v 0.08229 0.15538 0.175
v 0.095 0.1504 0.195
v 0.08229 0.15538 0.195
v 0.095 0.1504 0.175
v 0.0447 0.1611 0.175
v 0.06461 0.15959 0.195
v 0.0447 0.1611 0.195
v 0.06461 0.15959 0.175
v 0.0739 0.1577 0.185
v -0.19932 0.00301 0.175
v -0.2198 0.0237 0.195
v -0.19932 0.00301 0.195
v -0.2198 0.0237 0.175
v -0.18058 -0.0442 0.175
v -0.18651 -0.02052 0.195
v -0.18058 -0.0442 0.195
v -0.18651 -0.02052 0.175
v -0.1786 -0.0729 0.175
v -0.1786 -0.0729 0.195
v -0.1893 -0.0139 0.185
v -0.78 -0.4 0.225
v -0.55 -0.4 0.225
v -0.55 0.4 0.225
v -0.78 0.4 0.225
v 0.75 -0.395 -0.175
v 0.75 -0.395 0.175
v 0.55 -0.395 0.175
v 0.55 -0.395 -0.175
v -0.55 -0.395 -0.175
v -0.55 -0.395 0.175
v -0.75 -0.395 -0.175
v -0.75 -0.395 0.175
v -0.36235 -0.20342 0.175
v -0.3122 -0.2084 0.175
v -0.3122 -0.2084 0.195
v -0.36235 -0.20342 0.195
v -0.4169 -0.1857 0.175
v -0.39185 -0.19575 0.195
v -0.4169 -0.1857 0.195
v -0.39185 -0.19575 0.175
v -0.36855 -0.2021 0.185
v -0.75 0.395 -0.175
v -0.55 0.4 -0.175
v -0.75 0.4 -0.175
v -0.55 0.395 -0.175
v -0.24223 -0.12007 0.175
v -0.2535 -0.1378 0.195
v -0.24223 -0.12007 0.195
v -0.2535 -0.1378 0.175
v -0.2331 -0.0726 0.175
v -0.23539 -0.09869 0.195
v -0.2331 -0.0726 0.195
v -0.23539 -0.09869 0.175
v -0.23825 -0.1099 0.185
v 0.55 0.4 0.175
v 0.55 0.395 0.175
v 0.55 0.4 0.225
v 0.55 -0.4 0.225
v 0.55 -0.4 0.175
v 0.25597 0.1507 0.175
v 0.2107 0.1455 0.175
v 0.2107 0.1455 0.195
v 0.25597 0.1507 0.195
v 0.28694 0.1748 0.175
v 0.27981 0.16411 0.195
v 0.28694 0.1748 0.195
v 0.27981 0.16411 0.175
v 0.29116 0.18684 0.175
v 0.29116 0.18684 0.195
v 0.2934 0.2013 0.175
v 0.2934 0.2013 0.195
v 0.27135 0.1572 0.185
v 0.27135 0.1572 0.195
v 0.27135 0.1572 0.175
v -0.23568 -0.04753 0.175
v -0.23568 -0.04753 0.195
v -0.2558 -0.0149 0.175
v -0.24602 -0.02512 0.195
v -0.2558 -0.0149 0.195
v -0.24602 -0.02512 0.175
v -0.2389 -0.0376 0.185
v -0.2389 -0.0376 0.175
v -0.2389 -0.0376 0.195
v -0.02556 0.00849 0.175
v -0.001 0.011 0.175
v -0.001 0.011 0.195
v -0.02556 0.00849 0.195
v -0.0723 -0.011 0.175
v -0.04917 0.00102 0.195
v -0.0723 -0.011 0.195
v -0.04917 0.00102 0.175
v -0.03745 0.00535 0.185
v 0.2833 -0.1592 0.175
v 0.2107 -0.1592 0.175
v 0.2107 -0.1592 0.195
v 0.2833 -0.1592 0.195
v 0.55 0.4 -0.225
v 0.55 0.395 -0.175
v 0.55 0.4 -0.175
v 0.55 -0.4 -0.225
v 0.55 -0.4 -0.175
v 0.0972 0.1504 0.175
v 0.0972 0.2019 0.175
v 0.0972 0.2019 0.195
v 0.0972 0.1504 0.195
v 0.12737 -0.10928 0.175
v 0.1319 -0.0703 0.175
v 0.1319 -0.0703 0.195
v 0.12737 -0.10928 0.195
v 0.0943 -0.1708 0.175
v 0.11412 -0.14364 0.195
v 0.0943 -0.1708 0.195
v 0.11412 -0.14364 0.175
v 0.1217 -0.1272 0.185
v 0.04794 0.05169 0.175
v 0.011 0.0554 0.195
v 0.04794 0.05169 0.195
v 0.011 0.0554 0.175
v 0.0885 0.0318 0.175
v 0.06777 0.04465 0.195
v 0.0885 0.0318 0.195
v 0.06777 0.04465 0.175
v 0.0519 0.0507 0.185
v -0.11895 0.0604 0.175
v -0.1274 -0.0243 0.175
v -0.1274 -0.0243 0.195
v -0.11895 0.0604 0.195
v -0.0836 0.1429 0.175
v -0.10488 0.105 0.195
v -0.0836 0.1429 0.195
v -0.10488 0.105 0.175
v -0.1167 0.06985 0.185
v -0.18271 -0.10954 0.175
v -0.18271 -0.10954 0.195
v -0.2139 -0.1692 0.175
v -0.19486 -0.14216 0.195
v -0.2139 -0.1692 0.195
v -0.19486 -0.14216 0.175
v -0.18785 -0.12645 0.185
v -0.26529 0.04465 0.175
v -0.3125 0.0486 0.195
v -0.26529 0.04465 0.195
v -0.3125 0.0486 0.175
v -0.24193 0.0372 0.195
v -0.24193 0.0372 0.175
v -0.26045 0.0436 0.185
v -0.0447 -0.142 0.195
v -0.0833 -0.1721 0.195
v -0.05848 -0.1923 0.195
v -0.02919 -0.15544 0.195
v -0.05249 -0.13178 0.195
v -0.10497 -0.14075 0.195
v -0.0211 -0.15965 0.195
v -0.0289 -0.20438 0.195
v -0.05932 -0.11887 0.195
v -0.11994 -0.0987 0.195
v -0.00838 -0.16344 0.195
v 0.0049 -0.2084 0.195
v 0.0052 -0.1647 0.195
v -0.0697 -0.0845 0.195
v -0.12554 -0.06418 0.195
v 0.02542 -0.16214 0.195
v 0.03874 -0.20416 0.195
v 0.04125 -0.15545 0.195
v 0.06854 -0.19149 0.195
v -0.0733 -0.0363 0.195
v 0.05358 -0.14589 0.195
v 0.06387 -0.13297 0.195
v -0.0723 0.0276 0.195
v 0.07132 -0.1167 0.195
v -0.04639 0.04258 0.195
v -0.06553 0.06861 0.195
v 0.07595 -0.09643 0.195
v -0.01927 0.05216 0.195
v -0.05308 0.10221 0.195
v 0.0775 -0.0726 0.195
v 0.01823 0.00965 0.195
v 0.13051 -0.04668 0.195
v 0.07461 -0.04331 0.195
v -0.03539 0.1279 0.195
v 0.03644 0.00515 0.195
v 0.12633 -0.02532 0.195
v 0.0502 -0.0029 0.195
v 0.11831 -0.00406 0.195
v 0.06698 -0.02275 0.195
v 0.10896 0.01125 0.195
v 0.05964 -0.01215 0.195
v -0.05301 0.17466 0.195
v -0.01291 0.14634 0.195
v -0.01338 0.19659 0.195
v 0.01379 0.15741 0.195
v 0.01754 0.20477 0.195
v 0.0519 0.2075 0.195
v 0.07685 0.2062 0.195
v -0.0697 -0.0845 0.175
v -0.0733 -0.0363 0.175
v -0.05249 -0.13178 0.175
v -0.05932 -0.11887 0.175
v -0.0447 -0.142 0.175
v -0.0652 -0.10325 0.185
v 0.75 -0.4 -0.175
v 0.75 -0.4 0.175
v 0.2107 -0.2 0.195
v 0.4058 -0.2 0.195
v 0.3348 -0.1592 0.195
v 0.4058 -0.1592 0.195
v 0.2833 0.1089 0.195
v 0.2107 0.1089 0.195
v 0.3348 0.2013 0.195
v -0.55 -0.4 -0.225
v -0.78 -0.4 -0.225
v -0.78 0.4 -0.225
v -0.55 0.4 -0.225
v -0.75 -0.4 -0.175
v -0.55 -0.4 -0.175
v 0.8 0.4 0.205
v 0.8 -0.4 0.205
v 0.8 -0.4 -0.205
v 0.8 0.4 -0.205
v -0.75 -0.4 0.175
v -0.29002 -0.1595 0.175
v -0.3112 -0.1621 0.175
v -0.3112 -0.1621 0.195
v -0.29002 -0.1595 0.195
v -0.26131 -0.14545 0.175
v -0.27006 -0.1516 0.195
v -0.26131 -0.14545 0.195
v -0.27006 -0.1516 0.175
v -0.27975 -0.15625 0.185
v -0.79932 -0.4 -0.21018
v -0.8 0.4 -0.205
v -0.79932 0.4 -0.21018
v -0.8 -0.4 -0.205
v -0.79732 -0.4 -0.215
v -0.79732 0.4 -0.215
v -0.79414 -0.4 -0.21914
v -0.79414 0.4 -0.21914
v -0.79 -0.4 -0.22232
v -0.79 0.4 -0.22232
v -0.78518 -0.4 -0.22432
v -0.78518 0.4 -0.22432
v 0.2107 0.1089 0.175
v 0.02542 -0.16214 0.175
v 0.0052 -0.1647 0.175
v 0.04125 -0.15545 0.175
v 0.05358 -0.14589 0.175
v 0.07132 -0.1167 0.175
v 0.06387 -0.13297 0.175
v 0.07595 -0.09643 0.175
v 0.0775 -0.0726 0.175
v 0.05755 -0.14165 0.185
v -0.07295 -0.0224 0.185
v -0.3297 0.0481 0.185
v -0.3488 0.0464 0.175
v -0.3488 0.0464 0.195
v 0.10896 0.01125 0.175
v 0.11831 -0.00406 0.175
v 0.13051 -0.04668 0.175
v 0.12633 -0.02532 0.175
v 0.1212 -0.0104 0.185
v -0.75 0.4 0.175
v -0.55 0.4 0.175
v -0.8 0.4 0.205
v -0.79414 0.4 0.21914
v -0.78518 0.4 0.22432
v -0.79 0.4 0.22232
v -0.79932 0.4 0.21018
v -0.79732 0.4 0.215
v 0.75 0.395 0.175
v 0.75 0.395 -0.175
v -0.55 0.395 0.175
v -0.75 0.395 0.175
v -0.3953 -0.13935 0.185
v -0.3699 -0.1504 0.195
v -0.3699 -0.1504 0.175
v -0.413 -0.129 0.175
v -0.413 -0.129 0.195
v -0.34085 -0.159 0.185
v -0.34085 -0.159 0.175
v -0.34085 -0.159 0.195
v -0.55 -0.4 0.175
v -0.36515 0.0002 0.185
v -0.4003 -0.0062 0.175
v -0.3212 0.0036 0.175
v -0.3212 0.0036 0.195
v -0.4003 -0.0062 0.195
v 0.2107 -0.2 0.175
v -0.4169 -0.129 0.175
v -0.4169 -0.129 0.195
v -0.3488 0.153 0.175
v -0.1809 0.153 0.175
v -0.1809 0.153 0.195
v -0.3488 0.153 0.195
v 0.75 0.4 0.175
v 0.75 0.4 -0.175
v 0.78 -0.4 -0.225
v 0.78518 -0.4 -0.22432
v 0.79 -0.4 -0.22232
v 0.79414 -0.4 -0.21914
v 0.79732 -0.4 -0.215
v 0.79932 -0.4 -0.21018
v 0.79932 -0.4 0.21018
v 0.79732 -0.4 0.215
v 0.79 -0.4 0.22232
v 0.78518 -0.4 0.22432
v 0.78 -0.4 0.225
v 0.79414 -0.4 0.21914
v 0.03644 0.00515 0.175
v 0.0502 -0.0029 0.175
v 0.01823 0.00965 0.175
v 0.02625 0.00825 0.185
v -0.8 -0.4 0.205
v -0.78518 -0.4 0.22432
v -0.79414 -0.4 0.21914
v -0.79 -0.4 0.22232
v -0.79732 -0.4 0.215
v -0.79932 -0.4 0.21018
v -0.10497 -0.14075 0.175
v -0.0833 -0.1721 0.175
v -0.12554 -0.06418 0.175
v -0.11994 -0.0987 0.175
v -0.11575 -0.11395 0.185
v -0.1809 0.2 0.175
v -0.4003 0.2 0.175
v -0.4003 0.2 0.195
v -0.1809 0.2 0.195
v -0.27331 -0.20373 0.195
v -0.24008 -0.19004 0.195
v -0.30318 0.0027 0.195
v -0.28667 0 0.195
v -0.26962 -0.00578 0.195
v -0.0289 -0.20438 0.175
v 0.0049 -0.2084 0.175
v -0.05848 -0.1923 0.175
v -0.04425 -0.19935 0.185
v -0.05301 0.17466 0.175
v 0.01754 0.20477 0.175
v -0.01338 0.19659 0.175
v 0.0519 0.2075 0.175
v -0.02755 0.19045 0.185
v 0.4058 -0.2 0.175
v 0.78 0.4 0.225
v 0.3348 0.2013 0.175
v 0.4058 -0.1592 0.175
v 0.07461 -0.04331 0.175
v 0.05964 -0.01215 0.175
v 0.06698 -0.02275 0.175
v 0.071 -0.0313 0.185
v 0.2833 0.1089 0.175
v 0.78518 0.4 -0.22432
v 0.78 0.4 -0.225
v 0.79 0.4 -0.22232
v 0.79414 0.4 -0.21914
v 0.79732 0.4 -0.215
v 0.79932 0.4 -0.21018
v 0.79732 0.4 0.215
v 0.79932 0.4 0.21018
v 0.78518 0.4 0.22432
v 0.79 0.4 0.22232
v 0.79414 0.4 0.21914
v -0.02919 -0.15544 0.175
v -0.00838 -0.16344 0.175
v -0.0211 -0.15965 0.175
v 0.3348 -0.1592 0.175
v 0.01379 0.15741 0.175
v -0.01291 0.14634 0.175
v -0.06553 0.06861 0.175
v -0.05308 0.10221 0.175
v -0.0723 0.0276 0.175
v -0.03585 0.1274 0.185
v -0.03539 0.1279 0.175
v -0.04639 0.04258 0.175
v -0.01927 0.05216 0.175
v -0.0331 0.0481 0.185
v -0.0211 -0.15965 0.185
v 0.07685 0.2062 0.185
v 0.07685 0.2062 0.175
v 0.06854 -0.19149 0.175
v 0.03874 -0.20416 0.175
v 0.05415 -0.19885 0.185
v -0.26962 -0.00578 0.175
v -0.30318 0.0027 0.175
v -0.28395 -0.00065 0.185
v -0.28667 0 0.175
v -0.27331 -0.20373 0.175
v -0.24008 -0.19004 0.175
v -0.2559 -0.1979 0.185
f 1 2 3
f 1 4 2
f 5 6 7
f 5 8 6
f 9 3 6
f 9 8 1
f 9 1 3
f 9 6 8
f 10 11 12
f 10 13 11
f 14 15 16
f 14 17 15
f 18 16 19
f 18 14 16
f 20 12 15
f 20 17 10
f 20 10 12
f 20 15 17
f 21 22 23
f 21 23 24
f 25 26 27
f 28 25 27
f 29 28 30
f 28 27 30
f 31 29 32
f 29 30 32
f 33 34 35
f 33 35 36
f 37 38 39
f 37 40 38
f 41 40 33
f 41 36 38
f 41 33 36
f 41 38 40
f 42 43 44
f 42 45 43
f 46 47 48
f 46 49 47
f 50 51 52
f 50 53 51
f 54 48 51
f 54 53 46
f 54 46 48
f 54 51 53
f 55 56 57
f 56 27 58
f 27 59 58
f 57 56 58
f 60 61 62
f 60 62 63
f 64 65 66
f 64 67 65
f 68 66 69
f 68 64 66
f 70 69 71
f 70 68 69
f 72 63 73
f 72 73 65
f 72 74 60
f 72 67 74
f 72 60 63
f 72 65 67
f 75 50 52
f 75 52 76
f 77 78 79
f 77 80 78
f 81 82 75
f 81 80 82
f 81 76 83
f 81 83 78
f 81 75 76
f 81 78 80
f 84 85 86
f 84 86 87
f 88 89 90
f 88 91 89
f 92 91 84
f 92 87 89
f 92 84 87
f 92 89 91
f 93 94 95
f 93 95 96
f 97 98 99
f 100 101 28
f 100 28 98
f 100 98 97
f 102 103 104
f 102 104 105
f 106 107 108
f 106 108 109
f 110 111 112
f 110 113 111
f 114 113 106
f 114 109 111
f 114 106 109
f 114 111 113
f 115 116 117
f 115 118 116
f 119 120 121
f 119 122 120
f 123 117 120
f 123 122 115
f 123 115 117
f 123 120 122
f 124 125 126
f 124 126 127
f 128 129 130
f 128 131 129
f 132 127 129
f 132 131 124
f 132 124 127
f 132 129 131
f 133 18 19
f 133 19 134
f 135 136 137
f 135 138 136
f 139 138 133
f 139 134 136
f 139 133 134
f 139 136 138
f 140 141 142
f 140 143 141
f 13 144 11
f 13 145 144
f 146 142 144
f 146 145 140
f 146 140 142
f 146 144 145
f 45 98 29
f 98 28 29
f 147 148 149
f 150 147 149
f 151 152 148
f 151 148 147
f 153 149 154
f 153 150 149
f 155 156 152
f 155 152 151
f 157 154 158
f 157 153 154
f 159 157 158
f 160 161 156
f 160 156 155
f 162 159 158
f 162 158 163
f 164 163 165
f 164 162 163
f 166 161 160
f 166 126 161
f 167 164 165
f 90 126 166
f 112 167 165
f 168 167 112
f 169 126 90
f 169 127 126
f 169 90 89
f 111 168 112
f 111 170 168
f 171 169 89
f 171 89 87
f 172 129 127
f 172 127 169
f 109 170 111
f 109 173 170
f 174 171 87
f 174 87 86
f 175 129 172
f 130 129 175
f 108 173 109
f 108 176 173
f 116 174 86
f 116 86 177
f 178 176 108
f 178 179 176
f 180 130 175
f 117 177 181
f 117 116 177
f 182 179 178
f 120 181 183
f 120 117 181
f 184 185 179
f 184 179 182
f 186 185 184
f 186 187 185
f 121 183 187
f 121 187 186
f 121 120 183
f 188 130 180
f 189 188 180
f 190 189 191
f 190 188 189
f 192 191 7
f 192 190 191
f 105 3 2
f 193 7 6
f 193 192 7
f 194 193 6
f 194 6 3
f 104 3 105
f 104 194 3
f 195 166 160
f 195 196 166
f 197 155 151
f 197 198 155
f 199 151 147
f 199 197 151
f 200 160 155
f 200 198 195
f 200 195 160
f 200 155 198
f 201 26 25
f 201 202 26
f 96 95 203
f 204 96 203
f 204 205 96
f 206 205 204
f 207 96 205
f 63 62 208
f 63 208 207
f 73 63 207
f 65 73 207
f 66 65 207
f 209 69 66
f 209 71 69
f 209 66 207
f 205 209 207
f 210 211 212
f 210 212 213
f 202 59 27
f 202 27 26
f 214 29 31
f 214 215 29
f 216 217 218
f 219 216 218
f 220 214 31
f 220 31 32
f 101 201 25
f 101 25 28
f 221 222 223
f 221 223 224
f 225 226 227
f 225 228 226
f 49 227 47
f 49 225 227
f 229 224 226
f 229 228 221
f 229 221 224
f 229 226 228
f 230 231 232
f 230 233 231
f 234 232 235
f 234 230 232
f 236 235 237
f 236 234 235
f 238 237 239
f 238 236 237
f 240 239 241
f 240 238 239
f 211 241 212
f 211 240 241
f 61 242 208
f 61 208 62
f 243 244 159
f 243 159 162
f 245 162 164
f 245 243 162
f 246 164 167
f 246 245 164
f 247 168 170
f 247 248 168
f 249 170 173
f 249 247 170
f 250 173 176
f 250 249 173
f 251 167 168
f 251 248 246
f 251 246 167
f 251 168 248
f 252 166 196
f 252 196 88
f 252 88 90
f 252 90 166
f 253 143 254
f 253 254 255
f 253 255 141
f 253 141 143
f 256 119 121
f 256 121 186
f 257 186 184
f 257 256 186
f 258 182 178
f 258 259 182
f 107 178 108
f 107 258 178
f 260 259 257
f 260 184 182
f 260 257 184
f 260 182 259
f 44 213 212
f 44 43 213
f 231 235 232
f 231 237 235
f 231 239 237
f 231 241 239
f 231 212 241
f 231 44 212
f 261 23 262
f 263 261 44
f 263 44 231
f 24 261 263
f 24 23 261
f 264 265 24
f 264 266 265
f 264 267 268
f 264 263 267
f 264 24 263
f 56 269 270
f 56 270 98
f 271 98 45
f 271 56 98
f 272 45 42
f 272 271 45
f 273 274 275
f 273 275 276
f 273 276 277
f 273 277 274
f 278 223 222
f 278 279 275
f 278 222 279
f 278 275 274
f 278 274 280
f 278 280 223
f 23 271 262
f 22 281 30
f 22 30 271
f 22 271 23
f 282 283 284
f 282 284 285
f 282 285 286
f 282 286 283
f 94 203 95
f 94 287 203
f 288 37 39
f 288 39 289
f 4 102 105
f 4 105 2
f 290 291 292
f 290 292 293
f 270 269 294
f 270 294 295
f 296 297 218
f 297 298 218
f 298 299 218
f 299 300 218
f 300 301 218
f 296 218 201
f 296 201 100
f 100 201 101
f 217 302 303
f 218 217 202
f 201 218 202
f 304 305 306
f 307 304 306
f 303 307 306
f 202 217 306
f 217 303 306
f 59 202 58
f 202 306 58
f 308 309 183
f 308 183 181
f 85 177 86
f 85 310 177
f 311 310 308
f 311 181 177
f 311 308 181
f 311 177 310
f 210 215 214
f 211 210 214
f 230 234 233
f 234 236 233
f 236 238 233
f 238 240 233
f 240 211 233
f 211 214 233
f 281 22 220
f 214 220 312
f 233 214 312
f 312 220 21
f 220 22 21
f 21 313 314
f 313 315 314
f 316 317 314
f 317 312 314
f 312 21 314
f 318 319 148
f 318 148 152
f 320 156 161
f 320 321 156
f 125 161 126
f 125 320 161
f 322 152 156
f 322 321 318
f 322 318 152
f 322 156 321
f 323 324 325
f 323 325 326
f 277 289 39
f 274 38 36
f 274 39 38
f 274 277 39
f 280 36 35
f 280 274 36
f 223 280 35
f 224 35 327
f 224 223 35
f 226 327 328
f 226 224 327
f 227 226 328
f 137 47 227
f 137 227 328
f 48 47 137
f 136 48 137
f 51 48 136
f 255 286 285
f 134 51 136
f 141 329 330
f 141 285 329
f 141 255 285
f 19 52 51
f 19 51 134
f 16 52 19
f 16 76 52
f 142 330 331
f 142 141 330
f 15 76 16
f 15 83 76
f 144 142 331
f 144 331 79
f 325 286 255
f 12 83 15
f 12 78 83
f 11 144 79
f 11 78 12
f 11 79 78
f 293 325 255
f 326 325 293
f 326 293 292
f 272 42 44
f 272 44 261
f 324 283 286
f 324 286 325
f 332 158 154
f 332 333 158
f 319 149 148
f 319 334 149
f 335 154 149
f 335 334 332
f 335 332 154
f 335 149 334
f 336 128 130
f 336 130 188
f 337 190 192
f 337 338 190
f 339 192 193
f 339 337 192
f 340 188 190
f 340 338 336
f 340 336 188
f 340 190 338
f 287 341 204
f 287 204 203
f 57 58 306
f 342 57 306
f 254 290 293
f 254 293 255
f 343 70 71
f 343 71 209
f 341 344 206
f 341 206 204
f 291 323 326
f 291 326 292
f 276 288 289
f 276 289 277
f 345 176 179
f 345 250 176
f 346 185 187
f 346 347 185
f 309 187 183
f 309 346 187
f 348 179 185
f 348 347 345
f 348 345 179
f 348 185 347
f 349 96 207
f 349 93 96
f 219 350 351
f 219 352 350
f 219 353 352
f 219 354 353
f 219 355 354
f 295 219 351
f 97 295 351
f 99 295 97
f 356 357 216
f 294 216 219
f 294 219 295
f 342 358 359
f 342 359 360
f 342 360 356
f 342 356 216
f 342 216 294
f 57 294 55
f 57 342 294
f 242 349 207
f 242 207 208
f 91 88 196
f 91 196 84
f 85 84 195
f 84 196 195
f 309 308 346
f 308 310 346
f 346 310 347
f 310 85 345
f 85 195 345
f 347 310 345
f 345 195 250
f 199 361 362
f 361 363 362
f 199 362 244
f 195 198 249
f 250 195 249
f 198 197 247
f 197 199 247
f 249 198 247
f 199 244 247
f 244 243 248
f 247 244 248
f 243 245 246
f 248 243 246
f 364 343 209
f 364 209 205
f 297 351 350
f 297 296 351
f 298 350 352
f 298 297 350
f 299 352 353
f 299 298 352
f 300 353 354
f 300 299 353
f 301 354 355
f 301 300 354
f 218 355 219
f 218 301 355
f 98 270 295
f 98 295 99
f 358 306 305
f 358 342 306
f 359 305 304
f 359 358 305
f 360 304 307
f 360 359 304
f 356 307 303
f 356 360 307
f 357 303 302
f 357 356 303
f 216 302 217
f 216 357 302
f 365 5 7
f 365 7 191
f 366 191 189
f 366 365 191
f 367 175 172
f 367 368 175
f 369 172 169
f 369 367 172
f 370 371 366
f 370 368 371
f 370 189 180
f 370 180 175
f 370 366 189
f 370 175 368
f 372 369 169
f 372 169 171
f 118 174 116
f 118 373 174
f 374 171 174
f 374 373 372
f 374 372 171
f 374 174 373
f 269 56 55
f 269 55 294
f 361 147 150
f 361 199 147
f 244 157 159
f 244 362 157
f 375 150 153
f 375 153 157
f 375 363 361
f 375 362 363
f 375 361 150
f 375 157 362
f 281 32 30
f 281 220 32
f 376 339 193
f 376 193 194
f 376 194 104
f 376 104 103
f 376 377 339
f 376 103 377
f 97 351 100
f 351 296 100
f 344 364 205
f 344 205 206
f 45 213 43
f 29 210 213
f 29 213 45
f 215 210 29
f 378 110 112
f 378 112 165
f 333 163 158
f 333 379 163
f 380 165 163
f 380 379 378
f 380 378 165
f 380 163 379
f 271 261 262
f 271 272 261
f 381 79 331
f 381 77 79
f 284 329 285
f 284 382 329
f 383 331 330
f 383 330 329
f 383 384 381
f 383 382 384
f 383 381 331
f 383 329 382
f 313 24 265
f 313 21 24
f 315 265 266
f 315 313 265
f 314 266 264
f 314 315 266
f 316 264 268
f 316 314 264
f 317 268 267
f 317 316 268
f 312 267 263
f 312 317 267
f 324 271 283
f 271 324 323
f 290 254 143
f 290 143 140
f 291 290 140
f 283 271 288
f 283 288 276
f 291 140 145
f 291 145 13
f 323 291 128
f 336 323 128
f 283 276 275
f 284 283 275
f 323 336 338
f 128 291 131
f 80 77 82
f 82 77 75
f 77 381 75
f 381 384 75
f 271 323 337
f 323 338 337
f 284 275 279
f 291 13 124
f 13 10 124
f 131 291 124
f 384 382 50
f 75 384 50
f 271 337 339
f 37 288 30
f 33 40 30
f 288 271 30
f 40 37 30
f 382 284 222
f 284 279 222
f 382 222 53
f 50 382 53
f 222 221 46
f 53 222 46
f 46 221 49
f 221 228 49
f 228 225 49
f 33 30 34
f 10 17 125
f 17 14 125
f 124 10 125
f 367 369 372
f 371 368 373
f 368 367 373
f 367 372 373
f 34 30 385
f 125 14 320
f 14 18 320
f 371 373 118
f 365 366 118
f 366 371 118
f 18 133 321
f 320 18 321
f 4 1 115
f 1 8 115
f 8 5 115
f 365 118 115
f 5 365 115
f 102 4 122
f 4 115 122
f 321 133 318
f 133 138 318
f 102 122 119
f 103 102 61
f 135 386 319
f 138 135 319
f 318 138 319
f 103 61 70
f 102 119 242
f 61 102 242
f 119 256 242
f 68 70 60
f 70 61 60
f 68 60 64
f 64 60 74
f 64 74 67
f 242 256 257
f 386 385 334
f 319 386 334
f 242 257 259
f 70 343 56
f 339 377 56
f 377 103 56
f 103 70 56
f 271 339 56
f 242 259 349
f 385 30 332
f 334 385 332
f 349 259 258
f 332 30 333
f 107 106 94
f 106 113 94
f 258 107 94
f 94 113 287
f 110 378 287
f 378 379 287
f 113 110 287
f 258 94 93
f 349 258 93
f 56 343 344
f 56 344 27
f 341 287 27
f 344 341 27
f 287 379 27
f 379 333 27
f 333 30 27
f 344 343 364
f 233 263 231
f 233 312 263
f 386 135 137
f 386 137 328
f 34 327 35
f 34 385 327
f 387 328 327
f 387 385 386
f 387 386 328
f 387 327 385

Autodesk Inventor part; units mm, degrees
ref_plane "YZ Plane" through (0, 0, 0) normal (1, 0, 0) x (0, 1, 0)
ref_plane "XZ Plane" through (0, 0, 0) normal (0, 1, 0) x (-1, 0, 0)
ref_plane "XY Plane" through (0, 0, 0) normal (0, 0, 1) x (1, 0, 0)
sketch "Sketch1" plane through (0, 0, 0) normal (0, 1, 0) x (-1, 0, 0)
  line L0 (0.75, 0.175) -> (-0.75, 0.175)
  line L1 (-0.75, 0.175) -> (-0.75, -0.175)
  line L2 (-0.75, -0.175) -> (0.75, -0.175)
  line L3 (0.75, -0.175) -> (0.75, 0.175)
  line L4 (0.55, 0.175) -> (0.55, 0.225)
  line L5 (0.55, 0.225) -> (0.8, 0.225)
  line L6 (0.8, 0.225) -> (0.8, -0.225)
  line L7 (0.8, -0.225) -> (0.55, -0.225)
  line L8 (0.55, -0.225) -> (0.55, -0.175)
  line L9 (-0.55, 0.175) -> (-0.55, 0.225)
  line L10 (-0.55, 0.225) -> (-0.8, 0.225)
  line L11 (-0.8, 0.225) -> (-0.8, -0.225)
  line L12 (-0.8, -0.225) -> (-0.55, -0.225)
  line L13 (-0.55, -0.175) -> (-0.55, -0.225)
  line L14 (0.55, 0.175) -> (-0.55, 0.175)
  point P0 (0, 0)
  point P1 (0, 0.175)
  point P2 (0.75, 0)
  dimension "d0" = 1.6
  dimension "d1" = 0.05
  dimension "d2" = 0.05
  dimension "d3" = 0.45
  dimension "d4" = 0.25
extrude "Extrusion1" add sketch "Sketch1" along normal mid plane 0.8 contours L0 L4 L5 L6 L7 L8 L2 L3 | L0 L1 L2 L13 L12 L11 L10 L9
extrude "Extrusion2" add sketch "Sketch1" along normal mid plane 0.79 contours L3 L2 L1 L0
sketch "Sketch2" plane through (-0.55, -0.395, 0.175) normal (0, 0, 1) x (1, 0, 0)
  line L0 (0, 0) -> (0, 0.79) projected
  line L1 (1.1, 0) -> (0, 0) projected
  line L2 (1.1, 0) -> (1.1, 0.79) projected
  line L3 (0, 0.79) -> (1.1, 0.79) projected
  line L4 (0, 0.395) -> (1.1, 0.395) construction
  spline S0 degree 2 poles (0.3714, 0.3221) (0.3714, 0.2932) (0.3529, 0.2439) (0.3361, 0.2258) knots 0 0 0 1 2 2 2
  spline S1 degree 2 poles (0.3361, 0.2258) (0.3192, 0.2076) (0.269, 0.1866) (0.2378, 0.1866) knots 0 0 0 1 2 2 2
  spline S2 degree 2 poles (0.2378, 0.1866) (0.2093, 0.1866) (0.1536, 0.1992) (0.1331, 0.2093) knots 0 0 0 1 2 2 2
  line L5 (0.1331, 0.2093) -> (0.1331, 0.266)
  line L6 (0.1331, 0.266) -> (0.137, 0.266)
  spline S3 degree 2 poles (0.137, 0.266) (0.1432, 0.2615) (0.1662, 0.2498) (0.1801, 0.2446) knots 0 0 0 1 2 2 2
  spline S4 degree 2 poles (0.1801, 0.2446) (0.196, 0.2391) (0.2223, 0.2329) (0.2388, 0.2329) knots 0 0 0 1 2 2 2
  spline S5 degree 2 poles (0.2388, 0.2329) (0.255, 0.2329) (0.2855, 0.2446) (0.2965, 0.2572) knots 0 0 0 1 2 2 2
  spline S6 degree 2 poles (0.2965, 0.2572) (0.3066, 0.2692) (0.3169, 0.301) (0.3169, 0.3224) knots 0 0 0 1 2 2 2
  spline S7 degree 2 poles (0.3169, 0.3224) (0.3169, 0.3438) (0.3053, 0.371) (0.2942, 0.3801) knots 0 0 0 1 2 2 2
  spline S8 degree 2 poles (0.2942, 0.3801) (0.2829, 0.3901) (0.2492, 0.3986) (0.2288, 0.3986) knots 0 0 0 1 2 2 2
  spline S9 degree 2 poles (0.2288, 0.3986) (0.2067, 0.3986) (0.163, 0.3918) (0.1497, 0.3888) knots 0 0 0 1 2 2 2
  line L7 (0.1497, 0.3888) -> (0.1497, 0.595)
  line L8 (0.1497, 0.595) -> (0.3691, 0.595)
  line L9 (0.3691, 0.595) -> (0.3691, 0.548)
  line L10 (0.3691, 0.548) -> (0.2012, 0.548)
  line L11 (0.2012, 0.548) -> (0.2012, 0.4414)
  spline S10 degree 2 poles (0.2012, 0.4414) (0.2109, 0.4426) (0.2297, 0.4436) (0.2375, 0.4436) knots 0 0 0 1 2 2 2
  spline S11 degree 2 poles (0.2375, 0.4436) (0.2683, 0.4436) (0.3108, 0.4336) (0.3302, 0.4187) knots 0 0 0 1 2 2 2
  spline S12 degree 2 poles (0.3302, 0.4187) (0.35, 0.4038) (0.3714, 0.3584) (0.3714, 0.3221) knots 0 0 0 1 2 2 2
  spline S13 degree 2 poles (0.6819, 0.3247) (0.6819, 0.2939) (0.6615, 0.2417) (0.6443, 0.2242) knots 0 0 0 1 2 2 2
  spline S14 degree 2 poles (0.6443, 0.2242) (0.6265, 0.2057) (0.5818, 0.1866) (0.5549, 0.1866) knots 0 0 0 1 2 2 2
  spline S15 degree 2 poles (0.5549, 0.1866) (0.528, 0.1866) (0.4835, 0.2047) (0.4667, 0.2229) knots 0 0 0 1 2 2 2
  spline S16 degree 2 poles (0.4667, 0.2229) (0.4459, 0.2446) (0.4226, 0.3175) (0.4226, 0.3707) knots 0 0 0 1 2 2 2
  spline S17 degree 2 poles (0.4226, 0.3707) (0.4226, 0.4229) (0.444, 0.5068) (0.4664, 0.5379) knots 0 0 0 1 2 2 2
  spline S18 degree 2 poles (0.4664, 0.5379) (0.4881, 0.5684) (0.5568, 0.6025) (0.6019, 0.6025) knots 0 0 0 1 2 2 2
  spline S19 degree 2 poles (0.6019, 0.6025) (0.6152, 0.6025) (0.6385, 0.5999) (0.6472, 0.5969) knots 0 0 0 1 2 2 2
  line L12 (0.6472, 0.5969) -> (0.6472, 0.5454)
  line L13 (0.6472, 0.5454) -> (0.645, 0.5454)
  spline S20 degree 2 poles (0.645, 0.5454) (0.6375, 0.5493) (0.6103, 0.5561) (0.5947, 0.5561) knots 0 0 0 1 2 2 2
  spline S21 degree 2 poles (0.5947, 0.5561) (0.5448, 0.5561) (0.4835, 0.4887) (0.4777, 0.4226) knots 0 0 0 1 2 2 2
  spline S22 degree 2 poles (0.4777, 0.4226) (0.4968, 0.4358) (0.537, 0.4504) (0.561, 0.4504) knots 0 0 0 1 2 2 2
  spline S23 degree 2 poles (0.561, 0.4504) (0.5844, 0.4504) (0.6194, 0.441) (0.6385, 0.4268) knots 0 0 0 1 2 2 2
  spline S24 degree 2 poles (0.6385, 0.4268) (0.6605, 0.4102) (0.6819, 0.359) (0.6819, 0.3247) knots 0 0 0 1 2 2 2
  spline S25 degree 2 poles (0.6275, 0.3224) (0.6275, 0.347) (0.6145, 0.3804) (0.6002, 0.3921) knots 0 0 0 1 2 2 2
  spline S26 degree 2 poles (0.6002, 0.3921) (0.5895, 0.4005) (0.563, 0.406) (0.549, 0.406) knots 0 0 0 1 2 2 2
  spline S27 degree 2 poles (0.549, 0.406) (0.5302, 0.406) (0.4949, 0.3947) (0.4777, 0.384) knots 0 0 0 1 2 2 2
  spline S28 degree 2 poles (0.4777, 0.384) (0.4774, 0.3781) (0.4767, 0.3671) (0.4767, 0.3587) knots 0 0 0 1 2 2 2
  spline S29 degree 2 poles (0.4767, 0.3587) (0.4767, 0.3172) (0.4929, 0.2663) (0.5053, 0.253) knots 0 0 0 1 2 2 2
  spline S30 degree 2 poles (0.5053, 0.253) (0.5166, 0.2404) (0.5412, 0.2303) (0.5552, 0.2303) knots 0 0 0 1 2 2 2
  spline S31 degree 2 poles (0.5552, 0.2303) (0.5876, 0.2303) (0.6275, 0.2764) (0.6275, 0.3224) knots 0 0 0 1 2 2 2
  line L14 (0.9558, 0.195) -> (0.7607, 0.195)
  line L15 (0.7607, 0.195) -> (0.7607, 0.2358)
  line L16 (0.7607, 0.2358) -> (0.8333, 0.2358)
  line L17 (0.8333, 0.2358) -> (0.8333, 0.5039)
  line L18 (0.8333, 0.5039) -> (0.7607, 0.5039)
  line L19 (0.7607, 0.5039) -> (0.7607, 0.5405)
  spline S32 degree 2 poles (0.7607, 0.5405) (0.8019, 0.5405) (0.8408, 0.5639) (0.8434, 0.5963) knots 0 0 0 1 2 2 2
  line L20 (0.8434, 0.5963) -> (0.8848, 0.5963)
  line L21 (0.8848, 0.5963) -> (0.8848, 0.2358)
  line L22 (0.8848, 0.2358) -> (0.9558, 0.2358)
  line L23 (0.9558, 0.2358) -> (0.9558, 0.195)
  point P0 (0.55, 0.395)
extrude "Extrusion3" add sketch "Sketch2" along normal blind 0.02 contours S0 S1 S2 L5 L6 S3 S4 S5 S6 S7 S8 S9 L7 L8 L9 L10 L11 S10 S11 S12 | S13 S14 S15 S16 S17 S18 S19 L12 L13 S20 S21 S22 S23 S24 | L14 L15 L16 L17 L18 L19 S32 L20 L21 L22 L23
fillet "Fillet1" radius 0.02 4 edges at (-0.8, 0, 0.225) (-0.8, 0, -0.225) (0.8, 0, 0.225) (0.8, 0, -0.225)
equation "\"d2\" = d1"
properties part number "21-1001" material "Copper"
